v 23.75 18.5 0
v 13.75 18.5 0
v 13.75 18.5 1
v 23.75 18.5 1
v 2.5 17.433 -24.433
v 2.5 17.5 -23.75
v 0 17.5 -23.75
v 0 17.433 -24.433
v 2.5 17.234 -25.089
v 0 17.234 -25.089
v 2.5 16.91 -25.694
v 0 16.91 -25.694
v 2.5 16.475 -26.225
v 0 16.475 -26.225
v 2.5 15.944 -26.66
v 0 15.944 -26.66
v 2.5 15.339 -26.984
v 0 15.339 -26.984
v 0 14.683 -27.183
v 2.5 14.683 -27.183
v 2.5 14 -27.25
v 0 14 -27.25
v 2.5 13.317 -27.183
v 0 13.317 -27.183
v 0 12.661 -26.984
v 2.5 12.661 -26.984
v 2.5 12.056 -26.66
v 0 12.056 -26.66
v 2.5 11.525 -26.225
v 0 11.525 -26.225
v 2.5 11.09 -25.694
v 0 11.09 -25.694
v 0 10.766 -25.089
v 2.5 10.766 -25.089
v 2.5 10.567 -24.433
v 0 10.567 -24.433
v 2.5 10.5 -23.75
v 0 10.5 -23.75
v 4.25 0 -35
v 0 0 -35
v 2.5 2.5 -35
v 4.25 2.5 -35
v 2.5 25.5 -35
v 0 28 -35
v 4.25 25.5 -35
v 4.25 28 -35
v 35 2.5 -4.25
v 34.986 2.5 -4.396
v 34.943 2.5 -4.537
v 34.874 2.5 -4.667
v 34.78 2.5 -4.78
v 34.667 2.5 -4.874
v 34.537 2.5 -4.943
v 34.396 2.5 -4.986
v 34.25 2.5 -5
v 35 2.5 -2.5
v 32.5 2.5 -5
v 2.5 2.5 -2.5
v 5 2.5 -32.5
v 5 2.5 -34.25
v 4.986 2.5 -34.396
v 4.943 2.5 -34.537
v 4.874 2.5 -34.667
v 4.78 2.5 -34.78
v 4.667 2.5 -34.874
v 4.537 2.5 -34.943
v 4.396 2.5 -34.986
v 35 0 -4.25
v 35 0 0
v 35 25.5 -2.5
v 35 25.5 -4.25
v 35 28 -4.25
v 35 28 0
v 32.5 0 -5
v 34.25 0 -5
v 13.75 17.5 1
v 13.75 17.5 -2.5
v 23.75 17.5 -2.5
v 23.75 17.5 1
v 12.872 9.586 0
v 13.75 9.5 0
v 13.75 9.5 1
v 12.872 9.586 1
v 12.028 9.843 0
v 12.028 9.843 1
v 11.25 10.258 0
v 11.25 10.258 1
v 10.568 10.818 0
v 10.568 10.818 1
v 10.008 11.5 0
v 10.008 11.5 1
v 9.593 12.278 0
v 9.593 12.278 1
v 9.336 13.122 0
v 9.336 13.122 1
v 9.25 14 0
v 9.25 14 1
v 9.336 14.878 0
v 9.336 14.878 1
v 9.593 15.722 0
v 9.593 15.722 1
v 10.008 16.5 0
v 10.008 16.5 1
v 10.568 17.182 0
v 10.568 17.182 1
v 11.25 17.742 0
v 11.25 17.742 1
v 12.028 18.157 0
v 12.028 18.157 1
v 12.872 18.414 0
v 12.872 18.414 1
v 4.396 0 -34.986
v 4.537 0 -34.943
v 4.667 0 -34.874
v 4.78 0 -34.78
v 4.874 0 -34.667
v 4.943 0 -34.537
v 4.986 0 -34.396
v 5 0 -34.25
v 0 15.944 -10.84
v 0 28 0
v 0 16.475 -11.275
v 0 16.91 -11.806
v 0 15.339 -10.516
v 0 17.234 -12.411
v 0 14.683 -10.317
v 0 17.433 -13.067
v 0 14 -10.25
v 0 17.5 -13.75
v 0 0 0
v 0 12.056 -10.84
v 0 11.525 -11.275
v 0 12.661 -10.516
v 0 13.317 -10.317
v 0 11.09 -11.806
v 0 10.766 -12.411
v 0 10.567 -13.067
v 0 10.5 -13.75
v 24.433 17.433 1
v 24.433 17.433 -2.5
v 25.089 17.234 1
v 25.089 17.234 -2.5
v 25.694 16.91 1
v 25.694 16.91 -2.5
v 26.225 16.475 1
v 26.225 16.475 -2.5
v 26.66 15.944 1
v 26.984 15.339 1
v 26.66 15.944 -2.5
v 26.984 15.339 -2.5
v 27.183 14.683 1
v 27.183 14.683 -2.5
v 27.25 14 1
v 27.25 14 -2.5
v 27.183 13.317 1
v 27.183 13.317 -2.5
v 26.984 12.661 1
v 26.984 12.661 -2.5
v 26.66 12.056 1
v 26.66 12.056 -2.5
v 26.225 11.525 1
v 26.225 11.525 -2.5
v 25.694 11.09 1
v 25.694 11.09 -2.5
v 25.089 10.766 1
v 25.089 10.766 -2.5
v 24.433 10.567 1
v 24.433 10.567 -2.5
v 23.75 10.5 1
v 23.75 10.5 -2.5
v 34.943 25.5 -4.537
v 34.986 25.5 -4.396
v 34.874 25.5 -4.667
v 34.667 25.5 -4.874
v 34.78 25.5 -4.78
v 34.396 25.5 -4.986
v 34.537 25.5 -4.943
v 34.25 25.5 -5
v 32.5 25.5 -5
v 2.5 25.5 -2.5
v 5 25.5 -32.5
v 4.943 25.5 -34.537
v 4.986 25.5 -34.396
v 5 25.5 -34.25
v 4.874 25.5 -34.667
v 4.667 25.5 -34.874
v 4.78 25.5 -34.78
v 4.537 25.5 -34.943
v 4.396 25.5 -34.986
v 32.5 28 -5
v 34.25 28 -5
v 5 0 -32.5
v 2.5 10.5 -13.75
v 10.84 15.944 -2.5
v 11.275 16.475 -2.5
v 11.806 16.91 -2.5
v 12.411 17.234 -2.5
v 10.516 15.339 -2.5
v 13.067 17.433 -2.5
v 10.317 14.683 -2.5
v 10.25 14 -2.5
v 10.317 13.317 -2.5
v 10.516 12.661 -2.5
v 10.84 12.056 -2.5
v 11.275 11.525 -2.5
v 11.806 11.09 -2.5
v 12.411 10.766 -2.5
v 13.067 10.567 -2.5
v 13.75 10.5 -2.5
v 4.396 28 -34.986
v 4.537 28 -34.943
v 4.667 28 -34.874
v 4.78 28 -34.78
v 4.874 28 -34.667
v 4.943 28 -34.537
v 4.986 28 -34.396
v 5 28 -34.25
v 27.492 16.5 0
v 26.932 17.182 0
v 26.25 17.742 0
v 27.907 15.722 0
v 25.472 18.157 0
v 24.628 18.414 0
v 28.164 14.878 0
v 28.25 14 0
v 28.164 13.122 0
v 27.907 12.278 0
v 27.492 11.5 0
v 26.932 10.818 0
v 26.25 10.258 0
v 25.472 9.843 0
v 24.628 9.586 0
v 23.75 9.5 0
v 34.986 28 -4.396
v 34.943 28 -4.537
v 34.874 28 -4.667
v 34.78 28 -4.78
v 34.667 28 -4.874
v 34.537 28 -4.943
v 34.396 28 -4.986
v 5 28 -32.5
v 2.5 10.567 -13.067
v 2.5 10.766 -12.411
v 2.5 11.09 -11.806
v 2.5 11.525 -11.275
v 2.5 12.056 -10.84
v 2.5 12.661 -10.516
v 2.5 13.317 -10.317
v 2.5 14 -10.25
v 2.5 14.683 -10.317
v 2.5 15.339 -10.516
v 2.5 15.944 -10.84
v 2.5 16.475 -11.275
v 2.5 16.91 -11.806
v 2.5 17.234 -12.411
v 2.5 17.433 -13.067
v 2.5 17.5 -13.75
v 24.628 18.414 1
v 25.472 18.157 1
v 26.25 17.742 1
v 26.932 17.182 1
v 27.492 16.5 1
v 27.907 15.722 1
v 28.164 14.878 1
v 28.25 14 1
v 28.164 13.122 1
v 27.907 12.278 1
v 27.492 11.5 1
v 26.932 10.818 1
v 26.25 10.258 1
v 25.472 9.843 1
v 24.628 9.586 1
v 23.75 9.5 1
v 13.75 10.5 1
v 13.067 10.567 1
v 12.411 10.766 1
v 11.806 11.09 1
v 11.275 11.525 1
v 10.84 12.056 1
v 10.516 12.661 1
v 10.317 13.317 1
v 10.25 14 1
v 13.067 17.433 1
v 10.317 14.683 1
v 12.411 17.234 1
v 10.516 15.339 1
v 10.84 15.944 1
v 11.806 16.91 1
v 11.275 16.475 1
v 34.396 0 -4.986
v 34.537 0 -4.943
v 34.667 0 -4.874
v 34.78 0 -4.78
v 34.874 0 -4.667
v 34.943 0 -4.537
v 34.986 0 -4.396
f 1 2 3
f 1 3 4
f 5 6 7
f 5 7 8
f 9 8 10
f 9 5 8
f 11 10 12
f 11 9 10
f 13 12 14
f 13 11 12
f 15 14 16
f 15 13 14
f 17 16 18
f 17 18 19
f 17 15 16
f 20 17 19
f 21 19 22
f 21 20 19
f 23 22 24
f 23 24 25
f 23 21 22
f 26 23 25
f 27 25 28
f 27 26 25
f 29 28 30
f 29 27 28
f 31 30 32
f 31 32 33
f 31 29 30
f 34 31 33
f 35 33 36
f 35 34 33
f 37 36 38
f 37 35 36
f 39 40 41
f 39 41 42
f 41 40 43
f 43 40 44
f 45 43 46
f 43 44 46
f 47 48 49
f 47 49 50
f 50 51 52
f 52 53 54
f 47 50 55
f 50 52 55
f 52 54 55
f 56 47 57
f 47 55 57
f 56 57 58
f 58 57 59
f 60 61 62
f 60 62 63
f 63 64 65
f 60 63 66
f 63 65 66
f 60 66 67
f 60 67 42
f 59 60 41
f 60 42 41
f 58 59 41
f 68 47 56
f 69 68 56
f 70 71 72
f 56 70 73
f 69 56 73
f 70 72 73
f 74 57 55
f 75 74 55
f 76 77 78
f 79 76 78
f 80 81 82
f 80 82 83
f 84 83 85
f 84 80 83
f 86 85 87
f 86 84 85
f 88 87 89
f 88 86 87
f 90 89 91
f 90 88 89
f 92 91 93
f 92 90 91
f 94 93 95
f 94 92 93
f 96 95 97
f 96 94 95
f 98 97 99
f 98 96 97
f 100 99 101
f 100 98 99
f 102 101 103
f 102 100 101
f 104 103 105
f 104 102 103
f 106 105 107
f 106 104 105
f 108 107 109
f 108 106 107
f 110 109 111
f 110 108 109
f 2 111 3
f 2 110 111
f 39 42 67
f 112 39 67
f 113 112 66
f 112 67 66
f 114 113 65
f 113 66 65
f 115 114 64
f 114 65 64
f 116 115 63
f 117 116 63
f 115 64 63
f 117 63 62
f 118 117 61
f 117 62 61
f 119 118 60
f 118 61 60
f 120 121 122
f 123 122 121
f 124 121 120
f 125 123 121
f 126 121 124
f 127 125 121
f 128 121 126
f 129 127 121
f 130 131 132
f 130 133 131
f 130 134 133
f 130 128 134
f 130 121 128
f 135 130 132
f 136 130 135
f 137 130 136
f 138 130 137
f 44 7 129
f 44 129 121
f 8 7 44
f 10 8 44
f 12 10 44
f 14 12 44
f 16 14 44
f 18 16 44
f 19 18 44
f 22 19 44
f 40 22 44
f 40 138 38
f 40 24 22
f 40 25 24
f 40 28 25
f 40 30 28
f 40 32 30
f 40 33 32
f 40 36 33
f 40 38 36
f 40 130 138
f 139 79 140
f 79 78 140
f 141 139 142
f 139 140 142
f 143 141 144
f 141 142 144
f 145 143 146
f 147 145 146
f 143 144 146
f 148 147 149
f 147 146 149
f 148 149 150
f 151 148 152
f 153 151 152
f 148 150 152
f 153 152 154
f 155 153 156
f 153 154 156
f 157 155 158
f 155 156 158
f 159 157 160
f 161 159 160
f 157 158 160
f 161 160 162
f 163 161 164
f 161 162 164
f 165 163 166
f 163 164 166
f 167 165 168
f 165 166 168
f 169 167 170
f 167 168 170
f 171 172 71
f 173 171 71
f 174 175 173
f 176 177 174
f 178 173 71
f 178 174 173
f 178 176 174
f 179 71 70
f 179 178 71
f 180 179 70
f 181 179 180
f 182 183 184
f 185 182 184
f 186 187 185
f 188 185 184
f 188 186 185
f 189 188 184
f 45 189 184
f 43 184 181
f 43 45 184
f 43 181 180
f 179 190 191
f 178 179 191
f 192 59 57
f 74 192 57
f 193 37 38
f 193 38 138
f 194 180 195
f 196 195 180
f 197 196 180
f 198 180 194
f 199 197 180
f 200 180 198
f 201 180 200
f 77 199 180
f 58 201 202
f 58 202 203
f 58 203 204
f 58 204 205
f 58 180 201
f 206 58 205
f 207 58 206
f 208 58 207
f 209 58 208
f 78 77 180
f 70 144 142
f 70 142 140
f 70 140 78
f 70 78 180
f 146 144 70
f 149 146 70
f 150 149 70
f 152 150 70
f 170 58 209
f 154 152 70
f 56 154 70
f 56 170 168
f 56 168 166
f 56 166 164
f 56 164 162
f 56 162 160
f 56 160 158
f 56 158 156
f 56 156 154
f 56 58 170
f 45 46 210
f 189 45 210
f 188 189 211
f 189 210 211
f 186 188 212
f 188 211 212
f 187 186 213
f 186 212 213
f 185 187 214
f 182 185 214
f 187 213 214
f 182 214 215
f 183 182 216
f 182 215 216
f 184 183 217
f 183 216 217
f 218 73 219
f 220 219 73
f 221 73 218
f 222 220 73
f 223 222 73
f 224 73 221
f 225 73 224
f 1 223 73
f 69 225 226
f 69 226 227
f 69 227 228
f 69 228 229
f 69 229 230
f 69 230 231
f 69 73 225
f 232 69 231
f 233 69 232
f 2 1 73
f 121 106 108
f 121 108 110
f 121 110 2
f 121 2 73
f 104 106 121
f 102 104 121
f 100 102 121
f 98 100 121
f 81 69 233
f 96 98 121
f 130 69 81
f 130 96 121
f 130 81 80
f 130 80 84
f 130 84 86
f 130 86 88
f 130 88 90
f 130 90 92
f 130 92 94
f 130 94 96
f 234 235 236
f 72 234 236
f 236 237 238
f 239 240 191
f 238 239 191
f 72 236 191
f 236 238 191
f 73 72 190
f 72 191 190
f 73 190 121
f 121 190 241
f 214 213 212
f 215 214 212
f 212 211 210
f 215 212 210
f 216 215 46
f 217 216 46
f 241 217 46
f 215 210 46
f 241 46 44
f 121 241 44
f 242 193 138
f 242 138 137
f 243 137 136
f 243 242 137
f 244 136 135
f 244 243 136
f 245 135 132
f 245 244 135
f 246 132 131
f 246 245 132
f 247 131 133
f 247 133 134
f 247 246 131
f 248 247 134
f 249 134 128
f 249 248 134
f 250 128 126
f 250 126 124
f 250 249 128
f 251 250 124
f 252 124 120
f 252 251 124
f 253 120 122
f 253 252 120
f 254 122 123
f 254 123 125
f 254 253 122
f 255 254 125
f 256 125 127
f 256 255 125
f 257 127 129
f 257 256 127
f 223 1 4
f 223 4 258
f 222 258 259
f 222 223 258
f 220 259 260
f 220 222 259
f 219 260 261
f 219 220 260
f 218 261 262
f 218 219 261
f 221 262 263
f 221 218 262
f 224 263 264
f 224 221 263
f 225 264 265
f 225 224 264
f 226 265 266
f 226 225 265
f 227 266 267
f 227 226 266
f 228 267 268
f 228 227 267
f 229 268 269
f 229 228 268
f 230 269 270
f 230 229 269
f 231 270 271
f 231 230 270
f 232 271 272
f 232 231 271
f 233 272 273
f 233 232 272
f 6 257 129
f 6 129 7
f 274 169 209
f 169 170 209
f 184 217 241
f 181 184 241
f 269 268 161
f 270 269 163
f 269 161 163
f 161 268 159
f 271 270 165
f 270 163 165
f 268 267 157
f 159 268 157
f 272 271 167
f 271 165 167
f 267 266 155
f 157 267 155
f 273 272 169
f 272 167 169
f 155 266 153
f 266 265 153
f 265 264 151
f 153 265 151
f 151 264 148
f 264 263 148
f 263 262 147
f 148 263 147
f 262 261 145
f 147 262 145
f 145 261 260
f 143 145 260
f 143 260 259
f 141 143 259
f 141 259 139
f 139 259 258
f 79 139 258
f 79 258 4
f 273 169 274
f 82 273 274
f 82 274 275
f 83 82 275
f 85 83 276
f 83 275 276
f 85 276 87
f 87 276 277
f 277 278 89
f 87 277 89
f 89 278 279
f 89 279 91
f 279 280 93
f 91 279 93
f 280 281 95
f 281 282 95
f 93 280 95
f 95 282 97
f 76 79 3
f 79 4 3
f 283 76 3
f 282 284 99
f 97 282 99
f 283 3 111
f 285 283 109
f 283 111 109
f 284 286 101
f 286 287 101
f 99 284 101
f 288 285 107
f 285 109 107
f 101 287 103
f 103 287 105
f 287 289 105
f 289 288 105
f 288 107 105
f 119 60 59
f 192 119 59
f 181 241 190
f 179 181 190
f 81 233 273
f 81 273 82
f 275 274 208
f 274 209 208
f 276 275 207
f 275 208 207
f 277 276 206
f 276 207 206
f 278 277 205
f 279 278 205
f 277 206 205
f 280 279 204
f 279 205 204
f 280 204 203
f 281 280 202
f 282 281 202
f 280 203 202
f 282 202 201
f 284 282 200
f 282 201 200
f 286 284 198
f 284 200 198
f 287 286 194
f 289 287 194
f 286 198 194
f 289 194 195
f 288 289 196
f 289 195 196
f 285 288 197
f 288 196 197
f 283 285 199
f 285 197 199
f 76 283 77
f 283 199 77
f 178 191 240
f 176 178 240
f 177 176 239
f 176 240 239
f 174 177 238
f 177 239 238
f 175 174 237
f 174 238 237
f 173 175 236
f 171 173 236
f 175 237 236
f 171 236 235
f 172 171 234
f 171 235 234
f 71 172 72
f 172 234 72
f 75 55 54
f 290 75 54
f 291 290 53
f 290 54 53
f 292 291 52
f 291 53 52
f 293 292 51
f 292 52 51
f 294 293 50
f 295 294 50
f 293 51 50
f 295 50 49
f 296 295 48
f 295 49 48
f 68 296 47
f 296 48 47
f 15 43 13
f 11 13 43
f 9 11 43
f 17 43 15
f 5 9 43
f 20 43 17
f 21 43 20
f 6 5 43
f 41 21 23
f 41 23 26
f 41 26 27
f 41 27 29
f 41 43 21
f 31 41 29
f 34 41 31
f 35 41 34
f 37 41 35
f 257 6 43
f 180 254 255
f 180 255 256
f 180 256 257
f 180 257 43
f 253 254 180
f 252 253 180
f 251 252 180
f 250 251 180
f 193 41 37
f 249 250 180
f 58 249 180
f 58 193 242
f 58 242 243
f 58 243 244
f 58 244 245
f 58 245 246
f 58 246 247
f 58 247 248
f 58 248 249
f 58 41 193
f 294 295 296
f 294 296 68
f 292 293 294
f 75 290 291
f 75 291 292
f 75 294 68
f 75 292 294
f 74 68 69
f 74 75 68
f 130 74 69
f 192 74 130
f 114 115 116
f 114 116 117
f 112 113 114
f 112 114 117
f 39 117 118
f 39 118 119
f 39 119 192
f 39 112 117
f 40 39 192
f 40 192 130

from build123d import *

# Parameters (mm, degrees)
BOSS_EXTRUDE1_DEPTH = 28
BOSS_EXTRUDE2_DEPTH = 2.5
BOSS_EXTRUDE3_START = -25.5
BOSS_EXTRUDE3_DEPTH = 2.5
CUT_EXTRUDE1_DEPTH  = 2.5
CUT_EXTRUDE2_DEPTH  = 2.5
BOSS_EXTRUDE4_DEPTH = 1


with BuildPart() as part:
    # Sketch1 → Boss-Extrude1 (new body)
    with BuildSketch(Plane(origin=(0, 0, 0), x_dir=(1, 0, 0), z_dir=(0, 1, 0))):
        Polygon((0, 0), (0, 35), (2.5, 35), (2.5, 2.5), (35, 2.5), (35, 0), align=None)
    extrude(amount=BOSS_EXTRUDE1_DEPTH)

    # Sketch2 → Boss-Extrude2 (add)
    with BuildSketch(Plane(origin=(0, 28, 0), x_dir=(1, 0, 0), z_dir=(0, 1, 0))):
        with BuildLine():
            Line((2.5, 35), (4.25, 35))
            ThreePointArc((4.25, 35), (4.780330086, 34.780330086), (5, 34.25))
            Line((5, 34.25), (5, 32.5))
            Line((5, 32.5), (32.5, 5))
            Line((32.5, 5), (34.25, 5))
            ThreePointArc((34.25, 5), (34.780330086, 4.780330086), (35, 4.25))
            Line((35, 4.25), (35, 2.5))
            Line((35, 2.5), (2.5, 2.5))
            Line((2.5, 2.5), (2.5, 35))
        make_face()
    extrude(amount=-BOSS_EXTRUDE2_DEPTH)

    # Sketch2<2> → Boss-Extrude3 (add)
    with BuildSketch(Plane(origin=(0, 28, 0), x_dir=(1, 0, 0), z_dir=(0, 1, 0)).offset(BOSS_EXTRUDE3_START)):
        with BuildLine():
            Line((2.5, 35), (4.25, 35))
            ThreePointArc((4.25, 35), (4.780330086, 34.780330086), (5, 34.25))
            Line((5, 34.25), (5, 32.5))
            Line((5, 32.5), (32.5, 5))
            Line((32.5, 5), (34.25, 5))
            ThreePointArc((34.25, 5), (34.780330086, 4.780330086), (35, 4.25))
            Line((35, 4.25), (35, 2.5))
            Line((35, 2.5), (2.5, 2.5))
            Line((2.5, 2.5), (2.5, 35))
        make_face()
    extrude(amount=-BOSS_EXTRUDE3_DEPTH)

    # Sketch3 → Cut-Extrude1 (cut)
    with BuildSketch(Plane(origin=(0, 0, -2.5), x_dir=(-1, 0, 0), z_dir=(0, 0, -1))):
        with BuildLine():
            Line((-23.75, 17.5), (-13.75, 17.5))
            ThreePointArc((-13.75, 17.5), (-10.25, 14), (-13.75, 10.5))
            Line((-13.75, 10.5), (-23.75, 10.5))
            ThreePointArc((-23.75, 10.5), (-27.25, 14), (-23.75, 17.5))
        make_face()
    extrude(amount=-CUT_EXTRUDE1_DEPTH, mode=Mode.SUBTRACT)

    # Sketch4 → Cut-Extrude2 (cut)
    with BuildSketch(Plane(origin=(2.5, 0, 0), x_dir=(0, 0, -1), z_dir=(1, 0, 0))):
        with BuildLine():
            Line((13.75, 17.5), (23.75, 17.5))
            ThreePointArc((23.75, 17.5), (27.25, 14), (23.75, 10.5))
            Line((23.75, 10.5), (13.75, 10.5))
            ThreePointArc((13.75, 10.5), (10.25, 14), (13.75, 17.5))
        make_face()
    extrude(amount=-CUT_EXTRUDE2_DEPTH, mode=Mode.SUBTRACT)

    # Sketch5 → Boss-Extrude4 (add)
    with BuildSketch(Plane.XY):
        with BuildLine():
            Line((13.75, 18.5), (23.75, 18.5))
            ThreePointArc((23.75, 18.5), (28.25, 14), (23.75, 9.5))
            Line((23.75, 9.5), (13.75, 9.5))
            ThreePointArc((13.75, 9.5), (9.25, 14), (13.75, 18.5))
        make_face()
        with BuildLine():
            Line((13.75, 17.5), (23.75, 17.5))
            ThreePointArc((23.75, 17.5), (27.25, 14), (23.75, 10.5))
            Line((23.75, 10.5), (13.75, 10.5))
            ThreePointArc((13.75, 10.5), (10.25, 14), (13.75, 17.5))
        make_face(mode=Mode.SUBTRACT)
    extrude(amount=BOSS_EXTRUDE4_DEPTH)


solid = part.part
